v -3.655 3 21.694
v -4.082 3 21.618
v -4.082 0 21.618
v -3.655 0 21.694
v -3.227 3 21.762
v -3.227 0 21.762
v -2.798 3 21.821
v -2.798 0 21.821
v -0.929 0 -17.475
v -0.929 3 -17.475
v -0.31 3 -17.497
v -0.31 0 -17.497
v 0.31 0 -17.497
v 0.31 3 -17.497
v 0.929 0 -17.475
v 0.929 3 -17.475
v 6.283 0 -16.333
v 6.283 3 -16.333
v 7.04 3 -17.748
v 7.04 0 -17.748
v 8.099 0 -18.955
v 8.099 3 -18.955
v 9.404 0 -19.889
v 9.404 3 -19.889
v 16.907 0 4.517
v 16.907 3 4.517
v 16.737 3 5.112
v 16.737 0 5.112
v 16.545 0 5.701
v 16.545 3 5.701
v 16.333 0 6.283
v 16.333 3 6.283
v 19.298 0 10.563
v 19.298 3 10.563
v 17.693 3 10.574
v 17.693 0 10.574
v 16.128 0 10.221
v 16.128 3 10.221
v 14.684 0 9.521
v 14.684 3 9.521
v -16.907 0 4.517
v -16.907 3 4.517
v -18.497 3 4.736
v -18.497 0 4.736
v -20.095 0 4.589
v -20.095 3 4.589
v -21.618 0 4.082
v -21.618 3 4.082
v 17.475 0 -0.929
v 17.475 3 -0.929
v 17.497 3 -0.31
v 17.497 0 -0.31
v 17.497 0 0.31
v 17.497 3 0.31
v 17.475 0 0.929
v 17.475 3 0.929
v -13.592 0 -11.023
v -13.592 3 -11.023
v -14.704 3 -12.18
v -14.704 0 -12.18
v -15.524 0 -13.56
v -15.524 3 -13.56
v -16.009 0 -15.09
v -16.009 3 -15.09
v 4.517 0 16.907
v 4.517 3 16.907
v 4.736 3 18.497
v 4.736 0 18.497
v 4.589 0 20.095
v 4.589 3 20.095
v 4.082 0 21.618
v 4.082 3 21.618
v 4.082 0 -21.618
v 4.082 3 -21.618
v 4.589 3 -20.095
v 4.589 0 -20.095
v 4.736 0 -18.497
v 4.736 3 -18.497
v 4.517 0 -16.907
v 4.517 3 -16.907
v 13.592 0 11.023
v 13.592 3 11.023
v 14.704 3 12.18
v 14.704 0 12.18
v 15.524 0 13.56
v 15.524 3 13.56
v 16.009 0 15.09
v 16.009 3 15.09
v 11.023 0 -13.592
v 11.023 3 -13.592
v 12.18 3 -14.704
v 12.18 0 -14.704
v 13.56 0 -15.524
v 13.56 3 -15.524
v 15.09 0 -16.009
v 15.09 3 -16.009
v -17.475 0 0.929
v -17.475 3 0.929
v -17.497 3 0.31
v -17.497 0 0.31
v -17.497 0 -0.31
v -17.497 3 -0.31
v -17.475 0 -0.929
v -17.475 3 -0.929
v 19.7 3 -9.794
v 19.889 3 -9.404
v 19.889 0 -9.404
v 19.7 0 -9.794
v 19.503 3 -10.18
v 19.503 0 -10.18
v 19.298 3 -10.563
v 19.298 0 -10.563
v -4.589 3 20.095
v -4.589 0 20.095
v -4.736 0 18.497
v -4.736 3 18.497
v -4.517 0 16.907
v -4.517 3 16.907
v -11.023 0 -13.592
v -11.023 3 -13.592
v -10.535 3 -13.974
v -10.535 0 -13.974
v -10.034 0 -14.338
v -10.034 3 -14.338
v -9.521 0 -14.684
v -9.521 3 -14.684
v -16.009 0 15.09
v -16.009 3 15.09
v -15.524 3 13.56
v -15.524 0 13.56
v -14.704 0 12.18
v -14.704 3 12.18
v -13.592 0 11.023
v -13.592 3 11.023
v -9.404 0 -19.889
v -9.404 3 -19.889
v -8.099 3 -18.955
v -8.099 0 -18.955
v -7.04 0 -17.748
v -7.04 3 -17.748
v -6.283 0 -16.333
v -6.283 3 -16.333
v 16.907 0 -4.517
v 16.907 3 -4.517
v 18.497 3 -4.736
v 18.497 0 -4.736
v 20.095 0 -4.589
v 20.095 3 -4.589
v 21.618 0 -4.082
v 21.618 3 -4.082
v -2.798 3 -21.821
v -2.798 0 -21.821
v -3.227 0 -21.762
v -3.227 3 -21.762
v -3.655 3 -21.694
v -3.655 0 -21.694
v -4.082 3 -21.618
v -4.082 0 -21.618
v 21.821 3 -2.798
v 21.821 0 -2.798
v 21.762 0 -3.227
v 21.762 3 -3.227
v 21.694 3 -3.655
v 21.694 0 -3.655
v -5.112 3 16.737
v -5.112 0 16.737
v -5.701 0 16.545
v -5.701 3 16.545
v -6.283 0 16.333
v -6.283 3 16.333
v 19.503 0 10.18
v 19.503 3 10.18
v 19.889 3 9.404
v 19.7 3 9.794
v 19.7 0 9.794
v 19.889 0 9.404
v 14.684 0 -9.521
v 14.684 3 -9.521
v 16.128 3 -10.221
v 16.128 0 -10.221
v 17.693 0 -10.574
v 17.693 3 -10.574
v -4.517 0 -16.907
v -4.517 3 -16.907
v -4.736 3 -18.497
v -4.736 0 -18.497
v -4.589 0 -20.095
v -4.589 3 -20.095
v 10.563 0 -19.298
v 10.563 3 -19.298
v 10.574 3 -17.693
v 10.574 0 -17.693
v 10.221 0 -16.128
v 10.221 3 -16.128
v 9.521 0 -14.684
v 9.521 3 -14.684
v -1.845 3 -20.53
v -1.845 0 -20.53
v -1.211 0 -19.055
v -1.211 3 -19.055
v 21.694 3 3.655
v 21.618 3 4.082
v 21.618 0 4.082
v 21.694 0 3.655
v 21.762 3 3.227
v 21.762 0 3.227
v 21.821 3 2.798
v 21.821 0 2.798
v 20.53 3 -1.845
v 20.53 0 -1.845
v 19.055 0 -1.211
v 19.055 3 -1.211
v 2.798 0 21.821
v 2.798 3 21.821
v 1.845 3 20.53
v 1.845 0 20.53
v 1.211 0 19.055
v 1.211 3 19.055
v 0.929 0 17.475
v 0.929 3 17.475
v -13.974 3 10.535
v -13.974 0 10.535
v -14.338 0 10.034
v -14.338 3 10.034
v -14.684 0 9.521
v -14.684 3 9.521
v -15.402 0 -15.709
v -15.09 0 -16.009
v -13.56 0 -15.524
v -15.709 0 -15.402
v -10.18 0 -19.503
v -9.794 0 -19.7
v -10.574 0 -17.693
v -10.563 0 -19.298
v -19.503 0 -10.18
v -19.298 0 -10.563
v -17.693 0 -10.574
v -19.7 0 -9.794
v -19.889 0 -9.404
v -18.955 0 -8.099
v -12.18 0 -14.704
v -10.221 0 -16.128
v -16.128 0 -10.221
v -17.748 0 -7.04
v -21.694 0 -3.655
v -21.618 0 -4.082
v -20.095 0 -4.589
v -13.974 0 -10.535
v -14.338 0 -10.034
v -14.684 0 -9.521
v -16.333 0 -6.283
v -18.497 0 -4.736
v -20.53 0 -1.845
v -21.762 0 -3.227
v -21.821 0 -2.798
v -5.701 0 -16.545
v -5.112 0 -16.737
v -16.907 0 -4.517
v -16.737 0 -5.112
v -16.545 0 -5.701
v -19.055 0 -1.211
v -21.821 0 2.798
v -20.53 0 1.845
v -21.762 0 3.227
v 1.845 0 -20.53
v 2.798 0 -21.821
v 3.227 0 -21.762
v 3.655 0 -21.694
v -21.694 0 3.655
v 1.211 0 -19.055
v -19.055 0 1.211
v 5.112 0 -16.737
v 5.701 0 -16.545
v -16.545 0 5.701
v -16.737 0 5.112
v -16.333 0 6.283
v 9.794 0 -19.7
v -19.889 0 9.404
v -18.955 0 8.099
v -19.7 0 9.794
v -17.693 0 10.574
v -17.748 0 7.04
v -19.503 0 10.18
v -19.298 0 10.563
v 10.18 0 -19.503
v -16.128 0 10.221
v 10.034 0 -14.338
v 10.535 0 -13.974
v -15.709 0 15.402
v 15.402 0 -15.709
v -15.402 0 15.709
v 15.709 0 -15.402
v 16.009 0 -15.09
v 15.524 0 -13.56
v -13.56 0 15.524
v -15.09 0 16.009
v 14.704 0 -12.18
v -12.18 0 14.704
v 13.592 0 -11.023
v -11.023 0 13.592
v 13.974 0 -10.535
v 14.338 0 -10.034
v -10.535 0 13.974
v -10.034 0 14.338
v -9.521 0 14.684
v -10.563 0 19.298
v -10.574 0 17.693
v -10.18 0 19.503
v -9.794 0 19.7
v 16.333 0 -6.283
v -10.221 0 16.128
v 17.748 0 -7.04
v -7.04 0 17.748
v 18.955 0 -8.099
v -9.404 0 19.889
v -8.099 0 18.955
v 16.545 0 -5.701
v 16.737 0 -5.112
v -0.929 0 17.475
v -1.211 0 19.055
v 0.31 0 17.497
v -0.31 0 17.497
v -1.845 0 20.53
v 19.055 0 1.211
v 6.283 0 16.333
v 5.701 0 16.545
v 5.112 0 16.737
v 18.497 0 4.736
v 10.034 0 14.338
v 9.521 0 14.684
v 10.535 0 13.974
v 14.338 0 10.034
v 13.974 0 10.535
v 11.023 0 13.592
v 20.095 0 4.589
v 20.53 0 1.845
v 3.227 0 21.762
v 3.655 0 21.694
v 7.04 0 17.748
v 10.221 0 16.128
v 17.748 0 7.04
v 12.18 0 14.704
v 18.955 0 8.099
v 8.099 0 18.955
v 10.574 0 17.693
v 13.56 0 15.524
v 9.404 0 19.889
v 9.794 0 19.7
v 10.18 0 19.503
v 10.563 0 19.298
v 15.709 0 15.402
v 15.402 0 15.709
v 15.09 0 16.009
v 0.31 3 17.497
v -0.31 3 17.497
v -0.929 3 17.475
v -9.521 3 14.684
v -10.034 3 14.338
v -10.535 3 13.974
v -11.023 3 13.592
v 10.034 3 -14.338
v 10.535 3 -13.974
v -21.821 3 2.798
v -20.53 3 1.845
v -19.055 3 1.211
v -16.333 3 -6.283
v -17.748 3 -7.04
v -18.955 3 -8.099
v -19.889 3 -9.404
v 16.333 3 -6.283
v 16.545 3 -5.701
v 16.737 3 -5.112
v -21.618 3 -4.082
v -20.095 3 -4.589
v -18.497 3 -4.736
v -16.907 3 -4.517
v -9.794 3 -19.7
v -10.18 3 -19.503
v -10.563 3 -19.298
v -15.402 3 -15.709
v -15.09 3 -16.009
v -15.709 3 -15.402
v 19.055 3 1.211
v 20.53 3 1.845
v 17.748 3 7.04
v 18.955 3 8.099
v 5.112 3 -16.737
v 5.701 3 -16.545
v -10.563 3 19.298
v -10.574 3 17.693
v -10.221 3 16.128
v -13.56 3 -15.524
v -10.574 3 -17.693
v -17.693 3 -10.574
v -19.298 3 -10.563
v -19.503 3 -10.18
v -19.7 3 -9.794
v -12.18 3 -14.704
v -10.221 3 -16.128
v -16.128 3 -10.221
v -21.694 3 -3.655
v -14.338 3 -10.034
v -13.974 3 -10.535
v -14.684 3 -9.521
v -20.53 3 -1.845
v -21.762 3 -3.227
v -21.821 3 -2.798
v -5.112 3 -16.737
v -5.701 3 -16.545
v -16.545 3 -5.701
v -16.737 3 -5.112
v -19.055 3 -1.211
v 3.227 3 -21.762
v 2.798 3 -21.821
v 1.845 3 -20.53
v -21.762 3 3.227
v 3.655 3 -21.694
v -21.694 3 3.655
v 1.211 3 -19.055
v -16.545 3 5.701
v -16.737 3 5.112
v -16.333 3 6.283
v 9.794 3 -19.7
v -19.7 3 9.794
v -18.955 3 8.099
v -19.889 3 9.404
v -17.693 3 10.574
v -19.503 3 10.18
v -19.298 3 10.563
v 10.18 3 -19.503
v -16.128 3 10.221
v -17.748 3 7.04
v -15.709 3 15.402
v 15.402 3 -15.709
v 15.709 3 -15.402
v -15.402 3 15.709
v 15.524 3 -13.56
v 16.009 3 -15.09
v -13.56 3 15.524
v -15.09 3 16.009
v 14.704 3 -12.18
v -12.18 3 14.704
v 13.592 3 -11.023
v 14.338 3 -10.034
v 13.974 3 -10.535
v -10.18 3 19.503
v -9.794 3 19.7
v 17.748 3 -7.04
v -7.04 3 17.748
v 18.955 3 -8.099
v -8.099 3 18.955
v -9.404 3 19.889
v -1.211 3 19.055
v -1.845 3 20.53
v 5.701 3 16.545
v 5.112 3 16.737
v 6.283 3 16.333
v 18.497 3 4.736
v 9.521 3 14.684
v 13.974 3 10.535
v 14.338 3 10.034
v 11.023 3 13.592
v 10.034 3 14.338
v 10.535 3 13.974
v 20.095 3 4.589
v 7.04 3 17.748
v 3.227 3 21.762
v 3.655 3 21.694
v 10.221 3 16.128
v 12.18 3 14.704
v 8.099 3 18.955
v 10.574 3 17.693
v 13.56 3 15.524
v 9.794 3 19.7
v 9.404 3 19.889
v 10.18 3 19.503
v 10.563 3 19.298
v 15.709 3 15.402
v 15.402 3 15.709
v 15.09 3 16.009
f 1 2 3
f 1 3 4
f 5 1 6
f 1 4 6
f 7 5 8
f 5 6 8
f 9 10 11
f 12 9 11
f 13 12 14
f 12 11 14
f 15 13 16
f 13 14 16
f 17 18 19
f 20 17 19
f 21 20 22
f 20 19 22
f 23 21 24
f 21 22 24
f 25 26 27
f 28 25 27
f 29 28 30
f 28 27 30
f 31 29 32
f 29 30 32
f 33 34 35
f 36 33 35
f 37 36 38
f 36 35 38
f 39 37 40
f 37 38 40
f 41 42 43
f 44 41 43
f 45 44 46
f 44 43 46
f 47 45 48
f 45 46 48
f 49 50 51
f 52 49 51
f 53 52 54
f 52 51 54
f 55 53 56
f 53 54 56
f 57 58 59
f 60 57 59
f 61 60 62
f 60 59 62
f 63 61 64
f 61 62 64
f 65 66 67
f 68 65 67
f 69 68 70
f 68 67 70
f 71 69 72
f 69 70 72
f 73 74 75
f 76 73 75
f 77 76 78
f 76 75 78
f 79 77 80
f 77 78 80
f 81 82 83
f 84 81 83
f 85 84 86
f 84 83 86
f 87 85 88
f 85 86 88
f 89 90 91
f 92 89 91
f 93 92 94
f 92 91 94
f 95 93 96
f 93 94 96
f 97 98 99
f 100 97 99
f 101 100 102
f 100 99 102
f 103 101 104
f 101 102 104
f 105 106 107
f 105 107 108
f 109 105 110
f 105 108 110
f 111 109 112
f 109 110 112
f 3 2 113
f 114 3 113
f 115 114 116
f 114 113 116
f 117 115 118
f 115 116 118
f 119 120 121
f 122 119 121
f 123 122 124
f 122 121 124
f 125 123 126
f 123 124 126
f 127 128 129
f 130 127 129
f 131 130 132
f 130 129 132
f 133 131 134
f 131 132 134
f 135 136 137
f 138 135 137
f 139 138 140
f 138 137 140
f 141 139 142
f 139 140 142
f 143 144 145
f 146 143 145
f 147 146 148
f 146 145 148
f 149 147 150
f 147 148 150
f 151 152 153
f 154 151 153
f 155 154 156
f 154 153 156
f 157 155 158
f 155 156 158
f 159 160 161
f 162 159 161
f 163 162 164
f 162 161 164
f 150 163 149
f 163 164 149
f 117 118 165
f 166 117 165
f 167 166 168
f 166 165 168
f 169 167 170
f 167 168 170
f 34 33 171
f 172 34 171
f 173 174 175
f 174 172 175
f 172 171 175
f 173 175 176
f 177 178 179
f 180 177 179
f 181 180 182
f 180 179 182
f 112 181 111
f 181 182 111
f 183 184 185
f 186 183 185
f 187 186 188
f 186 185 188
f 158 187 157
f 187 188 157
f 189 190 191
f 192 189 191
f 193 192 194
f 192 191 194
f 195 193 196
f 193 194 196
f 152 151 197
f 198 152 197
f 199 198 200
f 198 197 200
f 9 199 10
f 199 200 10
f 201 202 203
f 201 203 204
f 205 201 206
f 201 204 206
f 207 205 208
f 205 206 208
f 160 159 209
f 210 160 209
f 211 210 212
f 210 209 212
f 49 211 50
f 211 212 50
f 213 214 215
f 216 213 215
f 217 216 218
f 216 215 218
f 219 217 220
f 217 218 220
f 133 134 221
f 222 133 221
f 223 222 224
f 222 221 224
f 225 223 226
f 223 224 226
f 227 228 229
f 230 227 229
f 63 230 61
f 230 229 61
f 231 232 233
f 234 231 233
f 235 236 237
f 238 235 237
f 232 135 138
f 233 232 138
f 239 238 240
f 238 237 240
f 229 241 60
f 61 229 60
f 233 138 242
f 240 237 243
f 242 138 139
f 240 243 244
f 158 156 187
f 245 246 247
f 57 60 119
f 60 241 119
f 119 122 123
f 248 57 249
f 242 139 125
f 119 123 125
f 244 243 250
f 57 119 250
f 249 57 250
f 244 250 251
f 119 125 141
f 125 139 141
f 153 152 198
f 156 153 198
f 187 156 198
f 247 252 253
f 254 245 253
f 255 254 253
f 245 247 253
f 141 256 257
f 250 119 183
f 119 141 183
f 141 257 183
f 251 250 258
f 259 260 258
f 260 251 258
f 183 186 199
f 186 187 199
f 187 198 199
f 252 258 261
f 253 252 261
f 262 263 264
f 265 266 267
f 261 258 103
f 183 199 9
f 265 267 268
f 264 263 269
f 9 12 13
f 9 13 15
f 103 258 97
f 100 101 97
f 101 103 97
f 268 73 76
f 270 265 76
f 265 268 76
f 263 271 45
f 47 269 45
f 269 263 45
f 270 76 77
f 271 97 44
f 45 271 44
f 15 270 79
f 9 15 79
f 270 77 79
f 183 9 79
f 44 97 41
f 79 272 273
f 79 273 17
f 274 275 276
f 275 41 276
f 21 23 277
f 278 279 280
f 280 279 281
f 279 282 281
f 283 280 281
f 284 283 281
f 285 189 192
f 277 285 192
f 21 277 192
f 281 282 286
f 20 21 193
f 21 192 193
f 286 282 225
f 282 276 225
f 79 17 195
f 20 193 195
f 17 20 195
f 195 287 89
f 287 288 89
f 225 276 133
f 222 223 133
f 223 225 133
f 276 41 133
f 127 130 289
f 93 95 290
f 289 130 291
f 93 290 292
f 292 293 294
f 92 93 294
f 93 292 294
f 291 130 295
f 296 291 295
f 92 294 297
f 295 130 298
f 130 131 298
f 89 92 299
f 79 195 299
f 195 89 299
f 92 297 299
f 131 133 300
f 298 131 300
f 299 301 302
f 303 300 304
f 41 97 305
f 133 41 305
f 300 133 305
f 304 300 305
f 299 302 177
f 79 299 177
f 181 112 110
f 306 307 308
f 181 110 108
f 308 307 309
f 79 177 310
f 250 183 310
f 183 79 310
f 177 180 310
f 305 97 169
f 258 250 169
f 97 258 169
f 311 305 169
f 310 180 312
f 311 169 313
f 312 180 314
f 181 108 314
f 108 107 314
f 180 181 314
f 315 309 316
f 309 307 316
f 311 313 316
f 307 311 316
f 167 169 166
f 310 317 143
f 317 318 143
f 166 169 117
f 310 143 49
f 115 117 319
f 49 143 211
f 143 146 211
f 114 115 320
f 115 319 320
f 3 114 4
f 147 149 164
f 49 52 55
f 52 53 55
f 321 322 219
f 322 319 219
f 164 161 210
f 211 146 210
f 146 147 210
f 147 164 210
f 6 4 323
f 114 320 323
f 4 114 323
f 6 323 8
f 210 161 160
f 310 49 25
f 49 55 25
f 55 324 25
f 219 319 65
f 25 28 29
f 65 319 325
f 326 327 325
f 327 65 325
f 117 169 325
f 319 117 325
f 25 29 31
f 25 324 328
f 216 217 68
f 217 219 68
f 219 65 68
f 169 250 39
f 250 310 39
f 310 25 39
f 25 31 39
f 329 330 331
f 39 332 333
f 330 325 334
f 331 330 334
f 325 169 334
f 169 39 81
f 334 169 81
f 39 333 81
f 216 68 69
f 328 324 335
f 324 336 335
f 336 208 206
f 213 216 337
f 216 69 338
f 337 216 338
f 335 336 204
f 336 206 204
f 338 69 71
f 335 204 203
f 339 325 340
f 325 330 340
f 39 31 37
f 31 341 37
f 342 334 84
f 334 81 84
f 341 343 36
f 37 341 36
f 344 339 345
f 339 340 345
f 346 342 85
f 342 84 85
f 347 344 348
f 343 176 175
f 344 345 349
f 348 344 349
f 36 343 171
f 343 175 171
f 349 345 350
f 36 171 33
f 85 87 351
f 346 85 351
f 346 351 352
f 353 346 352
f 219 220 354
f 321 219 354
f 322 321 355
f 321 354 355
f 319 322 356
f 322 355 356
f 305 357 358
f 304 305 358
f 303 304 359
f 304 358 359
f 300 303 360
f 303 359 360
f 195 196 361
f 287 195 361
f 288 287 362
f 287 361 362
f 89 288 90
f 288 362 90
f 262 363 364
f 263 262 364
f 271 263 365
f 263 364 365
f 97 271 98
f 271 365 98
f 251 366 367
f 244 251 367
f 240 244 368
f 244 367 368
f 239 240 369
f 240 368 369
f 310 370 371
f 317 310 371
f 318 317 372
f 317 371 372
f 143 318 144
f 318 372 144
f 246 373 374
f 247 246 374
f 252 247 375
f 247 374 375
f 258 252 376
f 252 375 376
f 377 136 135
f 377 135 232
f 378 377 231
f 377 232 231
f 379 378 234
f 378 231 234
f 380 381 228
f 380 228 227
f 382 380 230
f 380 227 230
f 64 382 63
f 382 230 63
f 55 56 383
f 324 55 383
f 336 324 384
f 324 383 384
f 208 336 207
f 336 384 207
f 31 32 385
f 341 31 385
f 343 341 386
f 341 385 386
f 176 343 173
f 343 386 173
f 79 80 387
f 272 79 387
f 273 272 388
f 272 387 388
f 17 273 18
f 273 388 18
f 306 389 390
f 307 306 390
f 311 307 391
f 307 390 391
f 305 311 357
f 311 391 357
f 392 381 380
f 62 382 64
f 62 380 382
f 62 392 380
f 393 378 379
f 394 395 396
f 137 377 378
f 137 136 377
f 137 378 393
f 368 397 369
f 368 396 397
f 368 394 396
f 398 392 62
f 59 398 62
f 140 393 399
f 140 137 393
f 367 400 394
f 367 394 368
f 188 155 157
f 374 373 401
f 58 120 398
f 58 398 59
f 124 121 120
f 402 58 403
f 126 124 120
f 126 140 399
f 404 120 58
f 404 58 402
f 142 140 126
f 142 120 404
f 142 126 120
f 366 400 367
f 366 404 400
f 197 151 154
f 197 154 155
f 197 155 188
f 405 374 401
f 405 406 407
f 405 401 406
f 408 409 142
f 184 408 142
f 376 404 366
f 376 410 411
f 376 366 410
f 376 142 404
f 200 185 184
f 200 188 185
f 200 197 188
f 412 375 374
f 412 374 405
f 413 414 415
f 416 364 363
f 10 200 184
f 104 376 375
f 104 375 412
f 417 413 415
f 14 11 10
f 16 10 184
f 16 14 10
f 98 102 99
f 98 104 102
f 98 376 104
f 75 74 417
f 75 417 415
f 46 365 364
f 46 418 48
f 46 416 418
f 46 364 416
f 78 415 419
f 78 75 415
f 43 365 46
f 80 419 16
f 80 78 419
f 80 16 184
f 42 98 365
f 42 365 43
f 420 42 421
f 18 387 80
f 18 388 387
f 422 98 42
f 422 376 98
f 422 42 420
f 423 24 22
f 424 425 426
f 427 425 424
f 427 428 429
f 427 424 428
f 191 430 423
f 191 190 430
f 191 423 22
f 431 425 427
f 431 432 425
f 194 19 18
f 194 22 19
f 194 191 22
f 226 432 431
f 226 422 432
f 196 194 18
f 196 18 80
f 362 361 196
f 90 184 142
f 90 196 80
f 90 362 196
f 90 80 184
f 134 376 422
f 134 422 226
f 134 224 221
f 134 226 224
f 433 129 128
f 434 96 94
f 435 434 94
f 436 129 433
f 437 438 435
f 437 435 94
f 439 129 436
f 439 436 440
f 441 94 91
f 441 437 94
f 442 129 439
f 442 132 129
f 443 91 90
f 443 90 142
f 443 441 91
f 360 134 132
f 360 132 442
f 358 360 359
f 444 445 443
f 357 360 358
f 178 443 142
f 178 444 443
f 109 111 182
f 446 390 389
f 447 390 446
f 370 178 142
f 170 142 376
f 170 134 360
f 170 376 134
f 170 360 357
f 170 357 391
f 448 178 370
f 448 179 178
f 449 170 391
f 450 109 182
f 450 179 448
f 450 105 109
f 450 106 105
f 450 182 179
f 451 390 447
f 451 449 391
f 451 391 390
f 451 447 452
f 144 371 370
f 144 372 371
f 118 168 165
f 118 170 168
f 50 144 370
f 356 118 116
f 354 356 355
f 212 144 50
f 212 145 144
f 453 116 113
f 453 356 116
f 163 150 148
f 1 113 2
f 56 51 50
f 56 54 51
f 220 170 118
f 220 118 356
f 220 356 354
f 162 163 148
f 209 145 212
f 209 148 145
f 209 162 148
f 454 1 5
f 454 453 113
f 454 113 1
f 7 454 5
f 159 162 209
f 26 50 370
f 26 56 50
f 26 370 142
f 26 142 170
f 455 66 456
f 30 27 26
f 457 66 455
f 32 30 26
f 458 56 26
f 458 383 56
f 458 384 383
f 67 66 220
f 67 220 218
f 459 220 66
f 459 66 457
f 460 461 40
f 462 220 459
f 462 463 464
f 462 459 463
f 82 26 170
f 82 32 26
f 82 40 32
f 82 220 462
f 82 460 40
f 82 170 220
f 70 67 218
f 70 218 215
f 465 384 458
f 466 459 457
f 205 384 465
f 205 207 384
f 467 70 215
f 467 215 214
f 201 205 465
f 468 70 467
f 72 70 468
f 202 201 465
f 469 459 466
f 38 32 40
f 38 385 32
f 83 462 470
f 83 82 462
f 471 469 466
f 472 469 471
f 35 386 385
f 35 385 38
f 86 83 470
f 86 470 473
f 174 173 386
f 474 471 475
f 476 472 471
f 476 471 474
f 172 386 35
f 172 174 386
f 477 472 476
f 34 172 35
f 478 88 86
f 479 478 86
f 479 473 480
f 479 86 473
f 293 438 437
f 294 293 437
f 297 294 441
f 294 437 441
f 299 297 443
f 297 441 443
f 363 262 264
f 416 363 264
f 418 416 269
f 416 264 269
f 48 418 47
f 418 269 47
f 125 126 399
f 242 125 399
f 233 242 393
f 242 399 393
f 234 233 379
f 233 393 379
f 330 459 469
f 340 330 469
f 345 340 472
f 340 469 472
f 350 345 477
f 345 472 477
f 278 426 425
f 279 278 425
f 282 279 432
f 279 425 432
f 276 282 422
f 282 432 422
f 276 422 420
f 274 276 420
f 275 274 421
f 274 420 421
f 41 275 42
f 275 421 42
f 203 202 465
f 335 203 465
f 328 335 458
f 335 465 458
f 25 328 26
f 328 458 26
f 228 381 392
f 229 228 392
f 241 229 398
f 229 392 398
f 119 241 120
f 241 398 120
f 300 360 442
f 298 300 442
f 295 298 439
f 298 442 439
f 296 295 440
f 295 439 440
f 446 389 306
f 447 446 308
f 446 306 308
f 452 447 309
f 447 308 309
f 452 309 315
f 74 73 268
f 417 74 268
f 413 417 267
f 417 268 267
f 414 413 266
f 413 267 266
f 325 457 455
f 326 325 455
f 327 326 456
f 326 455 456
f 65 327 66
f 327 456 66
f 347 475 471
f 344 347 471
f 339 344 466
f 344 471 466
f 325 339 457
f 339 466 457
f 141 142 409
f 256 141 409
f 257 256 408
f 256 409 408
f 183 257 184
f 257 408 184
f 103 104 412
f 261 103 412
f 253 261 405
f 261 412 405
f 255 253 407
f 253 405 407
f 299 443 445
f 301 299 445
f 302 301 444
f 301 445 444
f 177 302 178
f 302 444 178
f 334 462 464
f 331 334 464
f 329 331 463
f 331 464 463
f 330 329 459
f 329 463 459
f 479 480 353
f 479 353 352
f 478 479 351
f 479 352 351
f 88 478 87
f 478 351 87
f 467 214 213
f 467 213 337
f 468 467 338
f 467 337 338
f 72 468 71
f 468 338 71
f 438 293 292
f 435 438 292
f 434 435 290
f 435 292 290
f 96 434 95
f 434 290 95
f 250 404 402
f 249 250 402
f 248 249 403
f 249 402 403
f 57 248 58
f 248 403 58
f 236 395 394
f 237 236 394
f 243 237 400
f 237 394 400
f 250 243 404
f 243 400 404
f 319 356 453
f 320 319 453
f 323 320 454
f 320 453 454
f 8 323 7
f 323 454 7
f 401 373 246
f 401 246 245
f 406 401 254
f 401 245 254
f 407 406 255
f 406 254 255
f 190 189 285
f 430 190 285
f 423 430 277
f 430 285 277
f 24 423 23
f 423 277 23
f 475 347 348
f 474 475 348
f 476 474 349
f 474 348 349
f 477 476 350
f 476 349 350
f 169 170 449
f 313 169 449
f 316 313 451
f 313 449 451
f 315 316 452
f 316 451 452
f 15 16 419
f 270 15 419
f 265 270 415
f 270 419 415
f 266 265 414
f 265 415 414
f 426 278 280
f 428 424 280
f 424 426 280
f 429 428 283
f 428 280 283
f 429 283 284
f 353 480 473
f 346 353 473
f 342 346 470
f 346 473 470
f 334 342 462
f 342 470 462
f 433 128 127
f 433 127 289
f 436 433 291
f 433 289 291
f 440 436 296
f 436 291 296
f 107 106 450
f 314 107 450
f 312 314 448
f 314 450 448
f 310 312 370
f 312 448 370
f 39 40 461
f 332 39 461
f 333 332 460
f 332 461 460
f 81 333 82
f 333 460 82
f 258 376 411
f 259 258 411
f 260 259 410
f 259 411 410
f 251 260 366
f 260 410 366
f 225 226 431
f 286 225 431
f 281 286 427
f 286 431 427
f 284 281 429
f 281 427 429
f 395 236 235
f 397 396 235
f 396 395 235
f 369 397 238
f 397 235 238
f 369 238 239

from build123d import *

# Parameters (mm, degrees)
CROQUIS1_R              = 22
SALIENTE_EXTRUIR1_DEPTH = 3
CORTAR_EXTRUIR1_DEPTH   = 3
MATRIZC1_COUNT          = 20


with BuildPart() as part:
    # Croquis1 → Saliente-Extruir1 (new body)
    with BuildSketch(Plane(origin=(0, 0, 0), x_dir=(1, 0, 0), z_dir=(0, 1, 0))):
        with Locations(Location((0, 0, 0), (0, 0, 270))):  # turned: the seam where the file's is
            Circle(CROQUIS1_R)
    extrude(amount=SALIENTE_EXTRUIR1_DEPTH)

    # Croquis2 → Cortar-Extruir1 (cut)
    with BuildSketch(Plane(origin=(0, 3, 0), x_dir=(1, 0, 0), z_dir=(0, 1, 0))):
        with BuildLine():
            ThreePointArc((0.928527245, 17.475349414), (1.485995248, 19.810616222), (2.797926902, 21.821356627))
            ThreePointArc((2.797926902, 21.821356627), (0, 22), (-2.797926902, 21.821356627))
            ThreePointArc((-2.797926902, 21.821356627), (-1.485995248, 19.810616222), (-0.928527245, 17.475349414))
            ThreePointArc((-0.928527245, 17.475349414), (0, 17.5), (0.928527245, 17.475349414))
        make_face()
    cortar_extruir1 = extrude(amount=-CORTAR_EXTRUIR1_DEPTH, mode=Mode.SUBTRACT)

    # MatrizC1: Cortar-Extruir1 ×20 about axis
    matrizc1_axis = Axis((0, 0, 0), (0, 1, 0))
    for i in range(1, MATRIZC1_COUNT):
        add(cortar_extruir1.rotate(matrizc1_axis, i * 360 / MATRIZC1_COUNT), mode=Mode.SUBTRACT)


solid = part.part
